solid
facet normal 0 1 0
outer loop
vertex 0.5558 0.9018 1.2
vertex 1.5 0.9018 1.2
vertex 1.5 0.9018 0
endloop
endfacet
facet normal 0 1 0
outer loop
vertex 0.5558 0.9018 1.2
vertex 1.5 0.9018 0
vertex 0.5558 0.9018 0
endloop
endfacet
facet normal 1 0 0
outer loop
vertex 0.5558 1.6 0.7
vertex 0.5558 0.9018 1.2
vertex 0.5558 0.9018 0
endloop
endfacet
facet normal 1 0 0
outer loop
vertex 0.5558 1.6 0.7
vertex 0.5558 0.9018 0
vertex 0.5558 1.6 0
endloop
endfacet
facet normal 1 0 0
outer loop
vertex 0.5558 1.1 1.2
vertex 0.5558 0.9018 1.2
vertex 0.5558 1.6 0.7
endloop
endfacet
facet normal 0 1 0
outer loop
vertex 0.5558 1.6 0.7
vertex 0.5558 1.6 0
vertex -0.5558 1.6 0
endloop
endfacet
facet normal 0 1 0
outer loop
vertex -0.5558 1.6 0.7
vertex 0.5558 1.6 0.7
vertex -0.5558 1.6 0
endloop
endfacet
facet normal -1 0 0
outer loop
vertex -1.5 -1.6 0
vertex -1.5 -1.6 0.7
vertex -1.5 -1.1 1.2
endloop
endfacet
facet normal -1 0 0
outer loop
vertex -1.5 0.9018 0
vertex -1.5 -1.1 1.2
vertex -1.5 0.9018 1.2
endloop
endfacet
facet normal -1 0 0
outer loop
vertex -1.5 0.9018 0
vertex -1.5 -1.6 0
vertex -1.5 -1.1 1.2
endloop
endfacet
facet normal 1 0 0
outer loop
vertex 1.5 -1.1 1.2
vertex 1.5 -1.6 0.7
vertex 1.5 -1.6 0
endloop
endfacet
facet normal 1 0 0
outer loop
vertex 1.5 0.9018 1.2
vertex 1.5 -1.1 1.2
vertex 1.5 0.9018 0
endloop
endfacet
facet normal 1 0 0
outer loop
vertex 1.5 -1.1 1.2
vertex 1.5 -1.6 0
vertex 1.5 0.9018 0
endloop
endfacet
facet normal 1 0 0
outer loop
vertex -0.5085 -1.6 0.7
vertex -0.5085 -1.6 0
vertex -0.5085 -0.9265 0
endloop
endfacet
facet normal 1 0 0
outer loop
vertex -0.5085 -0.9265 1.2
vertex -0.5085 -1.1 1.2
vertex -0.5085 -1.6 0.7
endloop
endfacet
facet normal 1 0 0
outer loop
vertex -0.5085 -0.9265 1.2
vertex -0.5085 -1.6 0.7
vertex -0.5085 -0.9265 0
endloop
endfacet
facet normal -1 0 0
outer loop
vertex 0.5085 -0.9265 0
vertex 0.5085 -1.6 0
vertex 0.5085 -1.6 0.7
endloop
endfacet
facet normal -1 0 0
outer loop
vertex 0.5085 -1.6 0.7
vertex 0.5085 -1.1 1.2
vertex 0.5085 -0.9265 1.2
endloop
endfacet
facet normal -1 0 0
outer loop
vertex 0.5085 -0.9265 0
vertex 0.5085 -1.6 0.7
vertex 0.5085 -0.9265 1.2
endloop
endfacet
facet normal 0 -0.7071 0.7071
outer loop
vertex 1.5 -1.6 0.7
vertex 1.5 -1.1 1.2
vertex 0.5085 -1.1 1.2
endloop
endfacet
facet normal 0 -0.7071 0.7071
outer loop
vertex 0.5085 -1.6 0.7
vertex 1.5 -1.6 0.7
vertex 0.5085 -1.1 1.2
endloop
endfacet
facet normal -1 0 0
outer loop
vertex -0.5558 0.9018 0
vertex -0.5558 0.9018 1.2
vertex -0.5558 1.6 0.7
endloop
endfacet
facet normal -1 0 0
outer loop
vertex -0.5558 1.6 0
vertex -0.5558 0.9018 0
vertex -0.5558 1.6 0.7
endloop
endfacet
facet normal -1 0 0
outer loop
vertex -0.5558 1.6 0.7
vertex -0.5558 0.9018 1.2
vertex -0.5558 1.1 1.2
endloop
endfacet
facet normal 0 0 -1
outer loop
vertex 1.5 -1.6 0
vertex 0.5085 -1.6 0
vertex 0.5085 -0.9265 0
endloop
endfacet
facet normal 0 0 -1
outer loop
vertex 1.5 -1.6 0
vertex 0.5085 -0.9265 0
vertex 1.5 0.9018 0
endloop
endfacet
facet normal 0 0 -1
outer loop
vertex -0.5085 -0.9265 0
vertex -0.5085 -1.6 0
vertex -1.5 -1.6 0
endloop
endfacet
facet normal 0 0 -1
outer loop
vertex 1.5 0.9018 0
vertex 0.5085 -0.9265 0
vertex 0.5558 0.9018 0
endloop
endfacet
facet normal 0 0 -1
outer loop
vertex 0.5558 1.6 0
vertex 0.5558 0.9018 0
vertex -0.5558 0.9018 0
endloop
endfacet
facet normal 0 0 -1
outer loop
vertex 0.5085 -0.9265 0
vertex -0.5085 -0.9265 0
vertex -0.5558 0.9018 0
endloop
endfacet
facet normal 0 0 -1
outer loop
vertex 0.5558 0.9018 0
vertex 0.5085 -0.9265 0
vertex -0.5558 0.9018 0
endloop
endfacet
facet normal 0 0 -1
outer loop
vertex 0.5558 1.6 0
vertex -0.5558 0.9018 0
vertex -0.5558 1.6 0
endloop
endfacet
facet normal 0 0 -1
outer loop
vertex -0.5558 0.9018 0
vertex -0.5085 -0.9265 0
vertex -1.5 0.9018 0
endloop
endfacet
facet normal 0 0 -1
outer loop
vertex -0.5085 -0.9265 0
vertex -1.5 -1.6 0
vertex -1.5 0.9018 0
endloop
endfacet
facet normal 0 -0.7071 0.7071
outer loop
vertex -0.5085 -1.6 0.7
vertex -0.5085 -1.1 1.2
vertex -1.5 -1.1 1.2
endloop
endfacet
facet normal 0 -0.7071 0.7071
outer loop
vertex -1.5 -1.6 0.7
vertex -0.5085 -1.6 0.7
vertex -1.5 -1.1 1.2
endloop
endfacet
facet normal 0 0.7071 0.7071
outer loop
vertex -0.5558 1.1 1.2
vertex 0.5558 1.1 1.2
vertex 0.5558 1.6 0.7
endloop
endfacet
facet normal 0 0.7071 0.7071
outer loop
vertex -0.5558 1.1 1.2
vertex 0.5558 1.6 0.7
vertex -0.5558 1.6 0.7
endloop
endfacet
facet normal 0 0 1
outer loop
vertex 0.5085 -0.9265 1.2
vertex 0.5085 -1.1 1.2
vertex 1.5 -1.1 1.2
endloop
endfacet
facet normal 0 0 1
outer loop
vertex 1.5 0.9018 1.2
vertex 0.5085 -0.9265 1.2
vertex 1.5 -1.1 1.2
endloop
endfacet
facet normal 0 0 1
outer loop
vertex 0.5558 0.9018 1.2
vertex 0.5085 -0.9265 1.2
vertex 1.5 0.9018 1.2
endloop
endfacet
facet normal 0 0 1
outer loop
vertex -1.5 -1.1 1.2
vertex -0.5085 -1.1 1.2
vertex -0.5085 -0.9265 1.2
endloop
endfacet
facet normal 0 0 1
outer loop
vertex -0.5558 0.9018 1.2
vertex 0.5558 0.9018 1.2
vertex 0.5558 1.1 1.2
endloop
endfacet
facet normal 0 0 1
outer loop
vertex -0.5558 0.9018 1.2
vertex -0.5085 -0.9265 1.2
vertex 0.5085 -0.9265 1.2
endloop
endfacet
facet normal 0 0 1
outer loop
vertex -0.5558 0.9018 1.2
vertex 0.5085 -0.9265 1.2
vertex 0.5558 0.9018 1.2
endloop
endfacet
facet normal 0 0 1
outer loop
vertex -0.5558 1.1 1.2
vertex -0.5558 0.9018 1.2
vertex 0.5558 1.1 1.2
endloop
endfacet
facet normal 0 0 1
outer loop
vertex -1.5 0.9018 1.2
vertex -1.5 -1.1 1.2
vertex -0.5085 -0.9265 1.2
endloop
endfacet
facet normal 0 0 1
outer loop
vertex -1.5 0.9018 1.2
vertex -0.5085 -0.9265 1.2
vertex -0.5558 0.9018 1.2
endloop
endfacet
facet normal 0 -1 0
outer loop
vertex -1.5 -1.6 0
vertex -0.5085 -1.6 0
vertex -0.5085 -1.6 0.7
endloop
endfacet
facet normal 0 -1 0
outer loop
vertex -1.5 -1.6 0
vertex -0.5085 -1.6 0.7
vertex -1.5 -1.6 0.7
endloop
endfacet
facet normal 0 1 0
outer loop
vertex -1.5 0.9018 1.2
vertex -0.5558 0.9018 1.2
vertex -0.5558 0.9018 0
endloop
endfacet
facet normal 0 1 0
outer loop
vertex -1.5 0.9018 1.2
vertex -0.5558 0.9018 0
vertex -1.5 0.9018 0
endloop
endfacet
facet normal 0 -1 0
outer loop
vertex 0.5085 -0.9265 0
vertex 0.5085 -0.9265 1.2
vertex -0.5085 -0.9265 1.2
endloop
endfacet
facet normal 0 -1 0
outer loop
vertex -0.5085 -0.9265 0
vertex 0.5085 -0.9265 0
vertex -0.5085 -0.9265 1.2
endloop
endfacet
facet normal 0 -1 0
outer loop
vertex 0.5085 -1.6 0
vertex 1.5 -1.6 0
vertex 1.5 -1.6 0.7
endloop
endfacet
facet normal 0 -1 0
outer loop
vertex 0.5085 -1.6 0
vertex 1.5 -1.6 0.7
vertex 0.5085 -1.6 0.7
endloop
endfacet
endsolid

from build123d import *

# Parameters (mm, degrees)
SKETCH026_W             = 3.2
SKETCH026_H             = 3
PAD024_DEPTH            = 1.2
CHAMFER010_SIZE         = 0.5
SKETCH027_W             = 1.850896
SKETCH027_H             = 1.017
SKETCH027_W_2           = 1.709498
SKETCH027_H_2           = 1.155216
POCKET002_DEPTH         = 5
BODY024_PLACEMENT_ANGLE = 90


with BuildPart() as part:
    # Sketch026 → Pad024 (new body)
    with BuildSketch(Plane.XY):
        Rectangle(SKETCH026_W, SKETCH026_H)
    extrude(amount=PAD024_DEPTH)

    # Chamfer010
    chamfer010_edges = [part.edges().sort_by_distance(p)[0] for p in [
        (-1.6, 0, 1.2),
        (1.6, 0, 1.2),
    ]]
    chamfer(chamfer010_edges, length=CHAMFER010_SIZE)

    # Sketch027 (on Face5 of Chamfer010) → Pocket002 (cut)
    with BuildSketch(Plane.XY.offset(1.2)):
        with Locations((-1.851985, 0)):
            Rectangle(SKETCH027_W, SKETCH027_H)
        with Locations((1.75658, 1.133439)):
            Rectangle(SKETCH027_W_2, SKETCH027_H_2)
        with Locations((1.75658, -1.133439)):
            Rectangle(SKETCH027_W_2, SKETCH027_H_2)
    extrude(amount=-POCKET002_DEPTH, mode=Mode.SUBTRACT)


with BuildPart() as part_1:
    # Body024 placement: moved
    add(part.part.rotate(Axis((0, 0, 0), (0, 0, 1)), BODY024_PLACEMENT_ANGLE))


solid = part_1.part
